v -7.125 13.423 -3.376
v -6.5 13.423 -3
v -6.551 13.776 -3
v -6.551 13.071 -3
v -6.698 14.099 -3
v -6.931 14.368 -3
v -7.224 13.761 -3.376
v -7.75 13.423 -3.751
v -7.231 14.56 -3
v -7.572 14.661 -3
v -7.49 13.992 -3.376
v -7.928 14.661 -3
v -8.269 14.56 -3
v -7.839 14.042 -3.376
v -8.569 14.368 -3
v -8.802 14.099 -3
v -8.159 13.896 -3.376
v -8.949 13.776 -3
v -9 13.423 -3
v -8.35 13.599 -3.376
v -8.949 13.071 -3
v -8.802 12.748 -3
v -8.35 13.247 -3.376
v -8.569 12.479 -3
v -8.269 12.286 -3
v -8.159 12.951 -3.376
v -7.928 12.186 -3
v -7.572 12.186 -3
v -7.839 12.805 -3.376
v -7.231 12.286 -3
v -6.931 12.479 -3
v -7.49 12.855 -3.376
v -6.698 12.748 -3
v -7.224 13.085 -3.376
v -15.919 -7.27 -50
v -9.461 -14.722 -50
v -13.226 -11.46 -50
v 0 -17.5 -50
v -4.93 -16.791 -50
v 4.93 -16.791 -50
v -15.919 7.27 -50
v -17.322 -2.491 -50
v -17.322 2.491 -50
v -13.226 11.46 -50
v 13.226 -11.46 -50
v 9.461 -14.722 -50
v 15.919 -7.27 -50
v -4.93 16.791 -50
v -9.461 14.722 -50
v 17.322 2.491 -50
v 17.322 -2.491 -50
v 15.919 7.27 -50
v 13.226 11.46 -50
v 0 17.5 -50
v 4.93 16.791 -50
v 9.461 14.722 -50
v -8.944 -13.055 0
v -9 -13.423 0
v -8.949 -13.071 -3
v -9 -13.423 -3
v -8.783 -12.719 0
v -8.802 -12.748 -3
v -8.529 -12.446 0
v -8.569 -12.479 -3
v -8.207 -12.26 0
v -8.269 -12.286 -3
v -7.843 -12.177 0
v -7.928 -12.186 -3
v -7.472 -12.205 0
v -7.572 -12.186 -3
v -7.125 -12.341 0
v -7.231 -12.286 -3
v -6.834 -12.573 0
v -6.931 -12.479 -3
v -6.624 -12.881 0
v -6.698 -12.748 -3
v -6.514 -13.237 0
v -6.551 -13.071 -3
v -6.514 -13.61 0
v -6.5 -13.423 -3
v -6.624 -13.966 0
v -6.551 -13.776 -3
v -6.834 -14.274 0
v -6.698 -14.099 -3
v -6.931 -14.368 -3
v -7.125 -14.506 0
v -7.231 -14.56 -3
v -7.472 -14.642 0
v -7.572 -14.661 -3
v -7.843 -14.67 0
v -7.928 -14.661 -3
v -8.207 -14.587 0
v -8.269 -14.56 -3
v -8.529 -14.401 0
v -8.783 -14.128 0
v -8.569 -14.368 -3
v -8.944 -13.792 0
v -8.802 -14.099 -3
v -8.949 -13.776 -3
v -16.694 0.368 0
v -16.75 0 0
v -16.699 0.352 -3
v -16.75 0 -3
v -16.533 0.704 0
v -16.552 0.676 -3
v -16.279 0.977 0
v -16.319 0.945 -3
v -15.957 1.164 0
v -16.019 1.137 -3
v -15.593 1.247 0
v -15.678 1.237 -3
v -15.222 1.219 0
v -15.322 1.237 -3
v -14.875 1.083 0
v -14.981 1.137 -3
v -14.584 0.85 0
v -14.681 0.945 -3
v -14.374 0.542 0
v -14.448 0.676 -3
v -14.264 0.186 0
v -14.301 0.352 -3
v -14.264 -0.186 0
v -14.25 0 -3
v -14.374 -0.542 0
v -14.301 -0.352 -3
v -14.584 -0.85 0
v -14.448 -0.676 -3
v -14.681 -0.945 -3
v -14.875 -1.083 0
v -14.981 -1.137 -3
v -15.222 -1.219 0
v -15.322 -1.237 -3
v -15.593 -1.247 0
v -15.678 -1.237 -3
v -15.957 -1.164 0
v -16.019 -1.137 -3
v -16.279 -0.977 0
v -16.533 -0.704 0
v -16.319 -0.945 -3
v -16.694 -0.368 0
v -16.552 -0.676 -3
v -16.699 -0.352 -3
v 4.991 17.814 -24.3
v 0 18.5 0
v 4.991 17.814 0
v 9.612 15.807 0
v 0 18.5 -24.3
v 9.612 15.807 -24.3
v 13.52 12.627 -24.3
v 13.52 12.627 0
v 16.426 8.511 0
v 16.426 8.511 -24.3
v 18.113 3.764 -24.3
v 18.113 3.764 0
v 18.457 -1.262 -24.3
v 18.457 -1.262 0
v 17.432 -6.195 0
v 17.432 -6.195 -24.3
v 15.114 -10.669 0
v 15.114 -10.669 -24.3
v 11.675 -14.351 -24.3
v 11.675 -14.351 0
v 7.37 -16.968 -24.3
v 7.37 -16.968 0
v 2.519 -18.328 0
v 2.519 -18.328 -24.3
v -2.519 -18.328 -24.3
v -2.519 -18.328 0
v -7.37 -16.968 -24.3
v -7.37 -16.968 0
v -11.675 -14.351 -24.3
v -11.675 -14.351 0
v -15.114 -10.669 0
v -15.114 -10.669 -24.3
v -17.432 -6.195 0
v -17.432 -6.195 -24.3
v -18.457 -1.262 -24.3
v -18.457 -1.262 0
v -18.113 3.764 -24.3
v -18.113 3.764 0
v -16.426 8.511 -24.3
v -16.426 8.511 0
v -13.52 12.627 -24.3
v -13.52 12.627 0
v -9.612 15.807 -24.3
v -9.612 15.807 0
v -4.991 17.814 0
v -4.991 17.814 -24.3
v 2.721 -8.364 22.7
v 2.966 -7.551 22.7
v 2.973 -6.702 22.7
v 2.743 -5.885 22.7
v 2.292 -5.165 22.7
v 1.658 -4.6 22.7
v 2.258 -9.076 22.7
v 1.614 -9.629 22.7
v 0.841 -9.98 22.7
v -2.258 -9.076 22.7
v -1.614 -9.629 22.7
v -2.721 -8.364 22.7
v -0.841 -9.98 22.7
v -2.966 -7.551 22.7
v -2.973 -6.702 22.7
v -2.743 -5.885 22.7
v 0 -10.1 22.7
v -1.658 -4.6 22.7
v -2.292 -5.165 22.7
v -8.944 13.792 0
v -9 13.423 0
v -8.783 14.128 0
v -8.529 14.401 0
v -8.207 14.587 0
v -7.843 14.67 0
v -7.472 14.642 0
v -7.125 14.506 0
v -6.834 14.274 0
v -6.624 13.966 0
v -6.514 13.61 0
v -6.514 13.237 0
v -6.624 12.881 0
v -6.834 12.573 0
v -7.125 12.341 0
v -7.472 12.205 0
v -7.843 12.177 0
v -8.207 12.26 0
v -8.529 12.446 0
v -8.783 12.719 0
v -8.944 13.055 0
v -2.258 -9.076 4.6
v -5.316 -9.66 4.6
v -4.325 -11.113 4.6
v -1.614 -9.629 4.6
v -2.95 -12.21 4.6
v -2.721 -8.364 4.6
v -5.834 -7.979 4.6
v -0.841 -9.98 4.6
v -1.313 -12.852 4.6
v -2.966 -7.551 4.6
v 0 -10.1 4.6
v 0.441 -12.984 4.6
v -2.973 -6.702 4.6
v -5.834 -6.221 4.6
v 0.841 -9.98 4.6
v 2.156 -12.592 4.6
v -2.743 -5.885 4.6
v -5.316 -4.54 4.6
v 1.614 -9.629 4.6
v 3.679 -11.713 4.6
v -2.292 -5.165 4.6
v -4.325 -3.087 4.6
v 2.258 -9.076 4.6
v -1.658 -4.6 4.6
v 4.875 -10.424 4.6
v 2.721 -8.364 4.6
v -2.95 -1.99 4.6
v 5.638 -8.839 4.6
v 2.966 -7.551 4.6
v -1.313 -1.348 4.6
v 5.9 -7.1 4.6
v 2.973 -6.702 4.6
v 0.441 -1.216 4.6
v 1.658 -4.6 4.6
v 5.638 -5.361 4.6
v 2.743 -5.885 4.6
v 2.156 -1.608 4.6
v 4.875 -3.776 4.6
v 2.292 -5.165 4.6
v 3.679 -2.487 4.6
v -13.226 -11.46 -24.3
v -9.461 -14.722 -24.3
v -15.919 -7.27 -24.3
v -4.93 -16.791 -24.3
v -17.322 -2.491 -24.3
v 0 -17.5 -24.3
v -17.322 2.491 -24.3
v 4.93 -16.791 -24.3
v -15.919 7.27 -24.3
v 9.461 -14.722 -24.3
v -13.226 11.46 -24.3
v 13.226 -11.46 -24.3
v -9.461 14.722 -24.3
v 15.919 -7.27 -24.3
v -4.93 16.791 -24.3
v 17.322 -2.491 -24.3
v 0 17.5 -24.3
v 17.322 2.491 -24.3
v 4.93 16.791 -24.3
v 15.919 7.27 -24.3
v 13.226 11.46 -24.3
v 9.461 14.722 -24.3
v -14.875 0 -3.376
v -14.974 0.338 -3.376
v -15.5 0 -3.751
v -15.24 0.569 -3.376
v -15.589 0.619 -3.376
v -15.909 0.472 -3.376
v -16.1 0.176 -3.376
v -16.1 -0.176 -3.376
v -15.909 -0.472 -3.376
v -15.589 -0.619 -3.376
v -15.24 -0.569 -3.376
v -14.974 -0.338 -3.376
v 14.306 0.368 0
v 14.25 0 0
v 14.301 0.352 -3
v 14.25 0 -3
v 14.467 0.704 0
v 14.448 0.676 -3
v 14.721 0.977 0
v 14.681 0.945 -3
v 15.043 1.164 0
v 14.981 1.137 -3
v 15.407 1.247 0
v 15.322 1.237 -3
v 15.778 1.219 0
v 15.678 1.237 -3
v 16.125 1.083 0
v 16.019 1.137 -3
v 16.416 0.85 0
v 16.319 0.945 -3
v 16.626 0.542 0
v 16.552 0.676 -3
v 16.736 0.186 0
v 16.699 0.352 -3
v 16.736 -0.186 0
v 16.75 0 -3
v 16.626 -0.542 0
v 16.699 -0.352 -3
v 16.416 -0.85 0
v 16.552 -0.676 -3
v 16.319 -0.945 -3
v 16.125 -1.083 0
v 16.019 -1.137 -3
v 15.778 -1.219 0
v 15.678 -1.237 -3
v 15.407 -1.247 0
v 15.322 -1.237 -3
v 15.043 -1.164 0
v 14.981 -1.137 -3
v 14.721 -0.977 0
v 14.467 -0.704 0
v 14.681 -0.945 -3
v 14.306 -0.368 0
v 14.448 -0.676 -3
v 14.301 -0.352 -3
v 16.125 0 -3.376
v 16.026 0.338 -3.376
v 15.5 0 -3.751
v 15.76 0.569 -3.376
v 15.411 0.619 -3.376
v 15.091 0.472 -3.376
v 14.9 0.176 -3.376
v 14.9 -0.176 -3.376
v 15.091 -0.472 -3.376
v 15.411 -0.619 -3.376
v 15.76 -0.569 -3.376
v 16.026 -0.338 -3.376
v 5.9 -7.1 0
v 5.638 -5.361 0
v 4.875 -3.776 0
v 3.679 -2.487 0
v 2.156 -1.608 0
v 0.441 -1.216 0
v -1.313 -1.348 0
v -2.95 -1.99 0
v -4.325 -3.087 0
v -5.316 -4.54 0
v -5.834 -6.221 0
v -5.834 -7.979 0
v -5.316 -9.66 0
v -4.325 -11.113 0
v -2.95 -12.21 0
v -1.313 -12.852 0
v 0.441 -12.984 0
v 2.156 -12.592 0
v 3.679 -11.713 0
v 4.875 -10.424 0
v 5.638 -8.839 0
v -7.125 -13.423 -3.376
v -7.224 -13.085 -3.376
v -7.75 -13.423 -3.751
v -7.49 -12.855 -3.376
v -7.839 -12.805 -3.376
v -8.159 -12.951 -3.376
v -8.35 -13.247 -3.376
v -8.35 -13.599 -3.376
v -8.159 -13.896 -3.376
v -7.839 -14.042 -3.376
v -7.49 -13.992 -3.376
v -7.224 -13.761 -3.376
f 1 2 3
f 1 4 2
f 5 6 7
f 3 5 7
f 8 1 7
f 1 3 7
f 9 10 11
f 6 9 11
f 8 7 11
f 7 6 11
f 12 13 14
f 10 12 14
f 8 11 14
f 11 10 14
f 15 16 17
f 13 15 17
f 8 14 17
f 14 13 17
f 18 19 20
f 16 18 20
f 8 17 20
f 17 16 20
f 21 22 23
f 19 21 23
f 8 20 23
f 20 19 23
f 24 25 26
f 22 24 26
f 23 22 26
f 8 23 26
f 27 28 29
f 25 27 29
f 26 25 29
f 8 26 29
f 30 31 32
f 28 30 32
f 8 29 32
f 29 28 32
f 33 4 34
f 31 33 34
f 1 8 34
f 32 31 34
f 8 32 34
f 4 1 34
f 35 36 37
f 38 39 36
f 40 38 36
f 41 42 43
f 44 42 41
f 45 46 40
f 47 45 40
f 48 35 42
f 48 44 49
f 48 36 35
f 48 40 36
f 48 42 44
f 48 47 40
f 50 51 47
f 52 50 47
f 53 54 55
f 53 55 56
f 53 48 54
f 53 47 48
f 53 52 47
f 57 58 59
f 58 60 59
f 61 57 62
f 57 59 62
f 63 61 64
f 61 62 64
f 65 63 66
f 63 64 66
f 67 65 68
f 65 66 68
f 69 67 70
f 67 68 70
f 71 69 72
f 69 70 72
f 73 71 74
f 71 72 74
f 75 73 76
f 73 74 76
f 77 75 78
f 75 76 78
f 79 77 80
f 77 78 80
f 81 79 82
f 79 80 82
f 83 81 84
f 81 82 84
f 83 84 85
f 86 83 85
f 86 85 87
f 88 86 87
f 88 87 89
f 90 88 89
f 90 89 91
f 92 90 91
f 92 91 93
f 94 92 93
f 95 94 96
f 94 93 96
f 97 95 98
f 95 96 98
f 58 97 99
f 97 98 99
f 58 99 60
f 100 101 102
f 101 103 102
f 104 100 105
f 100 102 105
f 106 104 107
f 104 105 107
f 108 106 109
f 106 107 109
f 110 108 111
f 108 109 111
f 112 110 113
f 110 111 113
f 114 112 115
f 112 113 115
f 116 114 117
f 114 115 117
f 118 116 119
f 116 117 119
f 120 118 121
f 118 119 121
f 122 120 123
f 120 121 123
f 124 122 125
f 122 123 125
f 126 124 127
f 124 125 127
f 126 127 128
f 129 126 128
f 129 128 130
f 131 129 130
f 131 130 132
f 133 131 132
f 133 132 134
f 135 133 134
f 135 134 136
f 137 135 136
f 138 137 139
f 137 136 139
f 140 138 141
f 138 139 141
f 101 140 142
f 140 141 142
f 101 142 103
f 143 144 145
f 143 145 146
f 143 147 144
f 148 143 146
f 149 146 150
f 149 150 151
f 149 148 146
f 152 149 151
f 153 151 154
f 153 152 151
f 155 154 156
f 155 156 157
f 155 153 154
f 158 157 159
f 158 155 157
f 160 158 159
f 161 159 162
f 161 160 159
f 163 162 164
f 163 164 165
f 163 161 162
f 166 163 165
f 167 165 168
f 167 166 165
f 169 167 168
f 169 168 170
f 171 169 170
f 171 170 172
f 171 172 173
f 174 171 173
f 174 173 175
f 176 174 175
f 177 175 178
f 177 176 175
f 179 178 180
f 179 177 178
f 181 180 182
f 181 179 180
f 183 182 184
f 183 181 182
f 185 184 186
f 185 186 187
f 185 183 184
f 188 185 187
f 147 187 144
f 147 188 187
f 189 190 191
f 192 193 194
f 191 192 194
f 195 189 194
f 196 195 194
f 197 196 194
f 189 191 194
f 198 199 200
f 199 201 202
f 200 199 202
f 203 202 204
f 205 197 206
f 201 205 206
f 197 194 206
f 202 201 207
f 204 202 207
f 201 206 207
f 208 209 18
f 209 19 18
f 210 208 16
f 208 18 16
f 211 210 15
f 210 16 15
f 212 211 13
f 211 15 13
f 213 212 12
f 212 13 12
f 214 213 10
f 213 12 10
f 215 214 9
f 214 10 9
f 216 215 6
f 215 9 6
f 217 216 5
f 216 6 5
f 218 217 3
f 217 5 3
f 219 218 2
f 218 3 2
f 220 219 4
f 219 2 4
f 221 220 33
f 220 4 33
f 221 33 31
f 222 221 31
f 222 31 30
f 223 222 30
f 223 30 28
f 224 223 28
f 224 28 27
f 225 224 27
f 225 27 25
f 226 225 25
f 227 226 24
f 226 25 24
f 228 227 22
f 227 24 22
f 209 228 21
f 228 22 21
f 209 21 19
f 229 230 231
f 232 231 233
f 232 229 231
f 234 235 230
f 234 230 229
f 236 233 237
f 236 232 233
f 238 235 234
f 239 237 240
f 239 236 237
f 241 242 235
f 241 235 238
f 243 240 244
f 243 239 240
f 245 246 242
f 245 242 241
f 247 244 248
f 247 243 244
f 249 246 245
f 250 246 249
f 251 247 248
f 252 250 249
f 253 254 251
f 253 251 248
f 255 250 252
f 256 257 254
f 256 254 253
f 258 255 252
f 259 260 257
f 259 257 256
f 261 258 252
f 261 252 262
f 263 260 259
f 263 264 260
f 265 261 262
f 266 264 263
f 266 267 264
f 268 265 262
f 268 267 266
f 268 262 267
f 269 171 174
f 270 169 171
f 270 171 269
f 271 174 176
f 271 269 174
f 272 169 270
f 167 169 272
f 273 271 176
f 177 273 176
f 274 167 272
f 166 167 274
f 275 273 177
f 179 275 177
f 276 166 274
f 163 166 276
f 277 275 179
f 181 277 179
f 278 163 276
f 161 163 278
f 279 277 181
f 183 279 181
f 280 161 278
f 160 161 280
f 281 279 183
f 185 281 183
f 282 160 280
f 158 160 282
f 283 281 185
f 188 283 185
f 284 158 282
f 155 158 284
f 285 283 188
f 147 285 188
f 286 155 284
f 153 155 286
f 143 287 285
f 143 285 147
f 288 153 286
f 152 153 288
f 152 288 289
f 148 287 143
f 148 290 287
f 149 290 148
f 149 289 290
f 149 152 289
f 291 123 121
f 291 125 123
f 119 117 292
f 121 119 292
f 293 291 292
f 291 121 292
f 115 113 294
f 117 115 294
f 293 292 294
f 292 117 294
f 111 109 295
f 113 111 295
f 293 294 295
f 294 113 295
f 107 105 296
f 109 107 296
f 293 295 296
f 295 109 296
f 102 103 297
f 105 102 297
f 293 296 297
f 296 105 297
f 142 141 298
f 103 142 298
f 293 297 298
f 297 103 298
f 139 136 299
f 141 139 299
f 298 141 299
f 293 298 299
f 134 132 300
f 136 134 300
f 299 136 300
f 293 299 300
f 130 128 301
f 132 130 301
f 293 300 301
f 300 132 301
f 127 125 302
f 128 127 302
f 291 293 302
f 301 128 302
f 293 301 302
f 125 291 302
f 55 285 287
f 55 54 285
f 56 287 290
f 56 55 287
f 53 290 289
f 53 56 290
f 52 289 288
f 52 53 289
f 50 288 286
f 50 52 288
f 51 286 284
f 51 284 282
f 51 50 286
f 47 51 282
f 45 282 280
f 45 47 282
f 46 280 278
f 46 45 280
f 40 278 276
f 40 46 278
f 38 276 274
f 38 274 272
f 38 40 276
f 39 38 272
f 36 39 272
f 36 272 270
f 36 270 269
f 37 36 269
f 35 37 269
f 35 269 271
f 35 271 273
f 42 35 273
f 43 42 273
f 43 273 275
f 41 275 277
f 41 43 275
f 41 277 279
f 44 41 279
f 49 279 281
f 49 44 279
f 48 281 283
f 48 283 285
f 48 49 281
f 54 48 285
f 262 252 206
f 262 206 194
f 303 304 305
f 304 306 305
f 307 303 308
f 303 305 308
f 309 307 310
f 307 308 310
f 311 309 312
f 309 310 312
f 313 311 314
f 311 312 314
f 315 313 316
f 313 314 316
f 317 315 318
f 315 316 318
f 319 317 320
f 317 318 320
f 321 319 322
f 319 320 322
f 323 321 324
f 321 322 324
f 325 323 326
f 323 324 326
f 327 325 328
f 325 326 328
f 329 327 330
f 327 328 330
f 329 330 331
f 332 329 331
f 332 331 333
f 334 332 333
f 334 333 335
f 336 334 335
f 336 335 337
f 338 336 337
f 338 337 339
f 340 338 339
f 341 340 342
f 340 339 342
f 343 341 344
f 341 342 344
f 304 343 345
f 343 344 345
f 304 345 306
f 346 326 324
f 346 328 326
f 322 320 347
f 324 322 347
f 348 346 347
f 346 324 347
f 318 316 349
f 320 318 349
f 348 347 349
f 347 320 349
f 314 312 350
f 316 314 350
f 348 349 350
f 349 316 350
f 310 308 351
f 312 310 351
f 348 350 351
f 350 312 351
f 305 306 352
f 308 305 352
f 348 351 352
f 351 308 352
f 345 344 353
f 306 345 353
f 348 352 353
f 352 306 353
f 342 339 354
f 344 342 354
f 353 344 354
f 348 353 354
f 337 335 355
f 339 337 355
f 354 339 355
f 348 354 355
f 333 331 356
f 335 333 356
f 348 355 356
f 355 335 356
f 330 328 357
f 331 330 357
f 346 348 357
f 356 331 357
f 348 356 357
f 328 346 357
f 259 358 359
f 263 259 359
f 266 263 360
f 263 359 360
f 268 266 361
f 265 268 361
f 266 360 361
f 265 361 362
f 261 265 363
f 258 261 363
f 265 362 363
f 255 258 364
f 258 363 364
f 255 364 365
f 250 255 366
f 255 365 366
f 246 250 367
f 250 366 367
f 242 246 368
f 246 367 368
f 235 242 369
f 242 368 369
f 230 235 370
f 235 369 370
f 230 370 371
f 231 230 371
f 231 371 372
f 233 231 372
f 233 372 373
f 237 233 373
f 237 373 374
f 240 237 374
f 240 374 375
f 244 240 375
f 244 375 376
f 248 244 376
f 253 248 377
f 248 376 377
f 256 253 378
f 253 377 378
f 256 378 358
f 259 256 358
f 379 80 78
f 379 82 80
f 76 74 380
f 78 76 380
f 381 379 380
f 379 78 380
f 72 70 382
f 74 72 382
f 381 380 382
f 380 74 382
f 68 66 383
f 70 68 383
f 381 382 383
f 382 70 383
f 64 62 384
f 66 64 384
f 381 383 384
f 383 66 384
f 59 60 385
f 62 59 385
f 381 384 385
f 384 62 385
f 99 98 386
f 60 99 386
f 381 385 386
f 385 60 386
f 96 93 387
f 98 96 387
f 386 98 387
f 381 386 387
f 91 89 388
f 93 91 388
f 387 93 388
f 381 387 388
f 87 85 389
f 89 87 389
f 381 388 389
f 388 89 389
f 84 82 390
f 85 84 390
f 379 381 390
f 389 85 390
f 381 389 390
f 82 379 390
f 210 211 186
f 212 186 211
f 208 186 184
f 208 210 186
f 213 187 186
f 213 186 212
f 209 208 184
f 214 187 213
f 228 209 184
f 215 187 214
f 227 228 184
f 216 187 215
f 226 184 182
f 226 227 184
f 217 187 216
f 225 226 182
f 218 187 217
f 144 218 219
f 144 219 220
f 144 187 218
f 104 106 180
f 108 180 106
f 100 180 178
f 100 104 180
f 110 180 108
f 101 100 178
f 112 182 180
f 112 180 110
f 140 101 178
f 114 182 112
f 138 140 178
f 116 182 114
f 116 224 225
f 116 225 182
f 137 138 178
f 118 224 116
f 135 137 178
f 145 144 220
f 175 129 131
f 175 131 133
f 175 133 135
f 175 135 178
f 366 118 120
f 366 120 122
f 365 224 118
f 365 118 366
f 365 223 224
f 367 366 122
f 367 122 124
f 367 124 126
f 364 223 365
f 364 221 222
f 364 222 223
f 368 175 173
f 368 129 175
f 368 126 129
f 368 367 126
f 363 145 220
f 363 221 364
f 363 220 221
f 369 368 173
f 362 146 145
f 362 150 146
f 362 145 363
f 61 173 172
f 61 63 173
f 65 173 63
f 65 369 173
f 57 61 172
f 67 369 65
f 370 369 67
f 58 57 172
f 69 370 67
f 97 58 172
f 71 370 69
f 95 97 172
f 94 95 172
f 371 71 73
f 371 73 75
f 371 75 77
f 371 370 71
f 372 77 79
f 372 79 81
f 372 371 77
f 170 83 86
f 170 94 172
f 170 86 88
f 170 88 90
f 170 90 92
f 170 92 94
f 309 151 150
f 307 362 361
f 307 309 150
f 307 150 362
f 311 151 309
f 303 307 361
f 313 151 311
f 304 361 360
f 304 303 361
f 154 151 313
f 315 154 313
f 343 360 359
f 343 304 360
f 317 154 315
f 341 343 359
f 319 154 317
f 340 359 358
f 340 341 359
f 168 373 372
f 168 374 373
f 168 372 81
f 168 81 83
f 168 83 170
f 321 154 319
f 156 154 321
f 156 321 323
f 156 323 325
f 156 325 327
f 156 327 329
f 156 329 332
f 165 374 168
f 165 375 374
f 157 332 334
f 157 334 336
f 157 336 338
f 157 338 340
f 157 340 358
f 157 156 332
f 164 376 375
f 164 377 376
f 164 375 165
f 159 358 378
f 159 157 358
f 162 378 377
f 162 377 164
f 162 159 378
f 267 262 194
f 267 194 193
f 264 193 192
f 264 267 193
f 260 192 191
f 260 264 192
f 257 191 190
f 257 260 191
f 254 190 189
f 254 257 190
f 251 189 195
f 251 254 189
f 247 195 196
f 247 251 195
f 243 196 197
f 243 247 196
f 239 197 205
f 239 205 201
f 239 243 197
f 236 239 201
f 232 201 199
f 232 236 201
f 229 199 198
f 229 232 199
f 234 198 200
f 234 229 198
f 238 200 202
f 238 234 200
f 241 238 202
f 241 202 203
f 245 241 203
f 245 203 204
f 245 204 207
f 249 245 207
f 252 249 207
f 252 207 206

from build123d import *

# Parameters (mm, degrees)
BOSS_EXTRUDE1_DEPTH             = 22.7
SKETCH13_R                      = 5.9
BOSS_EXTRUDE2_DEPTH             = 4.6
TAP_DRILL_FOR_M3X0_5_TAP1_D     = 2.5
TAP_DRILL_FOR_M3X0_5_TAP1_DEPTH = 3
TAP_DRILL_FOR_M3X0_5_TAP1_TIP   = 0.751075774


with BuildPart() as part:
    # Sketch4 → Revolve1 (revolve)
    with BuildSketch(Plane(origin=(0, 0, 0), x_dir=(0, 0, -1), z_dir=(1, 0, 0))):
        Polygon((0, 0), (0, 18.5), (24.3, 18.5), (24.3, 17.5), (50, 17.5), (50, 0), align=None)
    revolve(axis=Axis((0, 0, 0), (0, 0, -1)))

    # Sketch12 → Boss-Extrude1 (add)
    with BuildSketch(Plane.XY):
        with BuildLine():
            Line((-1.658312395, -4.6), (1.658312395, -4.6))
            ThreePointArc((1.658312395, -4.6), (0, -10.1), (-1.658312395, -4.6))
        make_face()
    extrude(amount=BOSS_EXTRUDE1_DEPTH)

    # Sketch13 → Boss-Extrude2 (add)
    with BuildSketch(Plane.XY):
        with Locations((0, -7.1)):
            Circle(SKETCH13_R)
    extrude(amount=BOSS_EXTRUDE2_DEPTH)

    # Tap Drill for M3x0.5 Tap1
    with Locations(Plane.XY):
        with Locations((15.5, 0), (-15.5, 0), (-7.75, 13.423393759), (-7.75, -13.423393759)):
            Hole(TAP_DRILL_FOR_M3X0_5_TAP1_D / 2, depth=TAP_DRILL_FOR_M3X0_5_TAP1_DEPTH)
            with Locations((0, 0, -(TAP_DRILL_FOR_M3X0_5_TAP1_DEPTH + TAP_DRILL_FOR_M3X0_5_TAP1_TIP / 2))):  # 118° drill point
                Cone(0, TAP_DRILL_FOR_M3X0_5_TAP1_D / 2, TAP_DRILL_FOR_M3X0_5_TAP1_TIP, mode=Mode.SUBTRACT)


solid = part.part
